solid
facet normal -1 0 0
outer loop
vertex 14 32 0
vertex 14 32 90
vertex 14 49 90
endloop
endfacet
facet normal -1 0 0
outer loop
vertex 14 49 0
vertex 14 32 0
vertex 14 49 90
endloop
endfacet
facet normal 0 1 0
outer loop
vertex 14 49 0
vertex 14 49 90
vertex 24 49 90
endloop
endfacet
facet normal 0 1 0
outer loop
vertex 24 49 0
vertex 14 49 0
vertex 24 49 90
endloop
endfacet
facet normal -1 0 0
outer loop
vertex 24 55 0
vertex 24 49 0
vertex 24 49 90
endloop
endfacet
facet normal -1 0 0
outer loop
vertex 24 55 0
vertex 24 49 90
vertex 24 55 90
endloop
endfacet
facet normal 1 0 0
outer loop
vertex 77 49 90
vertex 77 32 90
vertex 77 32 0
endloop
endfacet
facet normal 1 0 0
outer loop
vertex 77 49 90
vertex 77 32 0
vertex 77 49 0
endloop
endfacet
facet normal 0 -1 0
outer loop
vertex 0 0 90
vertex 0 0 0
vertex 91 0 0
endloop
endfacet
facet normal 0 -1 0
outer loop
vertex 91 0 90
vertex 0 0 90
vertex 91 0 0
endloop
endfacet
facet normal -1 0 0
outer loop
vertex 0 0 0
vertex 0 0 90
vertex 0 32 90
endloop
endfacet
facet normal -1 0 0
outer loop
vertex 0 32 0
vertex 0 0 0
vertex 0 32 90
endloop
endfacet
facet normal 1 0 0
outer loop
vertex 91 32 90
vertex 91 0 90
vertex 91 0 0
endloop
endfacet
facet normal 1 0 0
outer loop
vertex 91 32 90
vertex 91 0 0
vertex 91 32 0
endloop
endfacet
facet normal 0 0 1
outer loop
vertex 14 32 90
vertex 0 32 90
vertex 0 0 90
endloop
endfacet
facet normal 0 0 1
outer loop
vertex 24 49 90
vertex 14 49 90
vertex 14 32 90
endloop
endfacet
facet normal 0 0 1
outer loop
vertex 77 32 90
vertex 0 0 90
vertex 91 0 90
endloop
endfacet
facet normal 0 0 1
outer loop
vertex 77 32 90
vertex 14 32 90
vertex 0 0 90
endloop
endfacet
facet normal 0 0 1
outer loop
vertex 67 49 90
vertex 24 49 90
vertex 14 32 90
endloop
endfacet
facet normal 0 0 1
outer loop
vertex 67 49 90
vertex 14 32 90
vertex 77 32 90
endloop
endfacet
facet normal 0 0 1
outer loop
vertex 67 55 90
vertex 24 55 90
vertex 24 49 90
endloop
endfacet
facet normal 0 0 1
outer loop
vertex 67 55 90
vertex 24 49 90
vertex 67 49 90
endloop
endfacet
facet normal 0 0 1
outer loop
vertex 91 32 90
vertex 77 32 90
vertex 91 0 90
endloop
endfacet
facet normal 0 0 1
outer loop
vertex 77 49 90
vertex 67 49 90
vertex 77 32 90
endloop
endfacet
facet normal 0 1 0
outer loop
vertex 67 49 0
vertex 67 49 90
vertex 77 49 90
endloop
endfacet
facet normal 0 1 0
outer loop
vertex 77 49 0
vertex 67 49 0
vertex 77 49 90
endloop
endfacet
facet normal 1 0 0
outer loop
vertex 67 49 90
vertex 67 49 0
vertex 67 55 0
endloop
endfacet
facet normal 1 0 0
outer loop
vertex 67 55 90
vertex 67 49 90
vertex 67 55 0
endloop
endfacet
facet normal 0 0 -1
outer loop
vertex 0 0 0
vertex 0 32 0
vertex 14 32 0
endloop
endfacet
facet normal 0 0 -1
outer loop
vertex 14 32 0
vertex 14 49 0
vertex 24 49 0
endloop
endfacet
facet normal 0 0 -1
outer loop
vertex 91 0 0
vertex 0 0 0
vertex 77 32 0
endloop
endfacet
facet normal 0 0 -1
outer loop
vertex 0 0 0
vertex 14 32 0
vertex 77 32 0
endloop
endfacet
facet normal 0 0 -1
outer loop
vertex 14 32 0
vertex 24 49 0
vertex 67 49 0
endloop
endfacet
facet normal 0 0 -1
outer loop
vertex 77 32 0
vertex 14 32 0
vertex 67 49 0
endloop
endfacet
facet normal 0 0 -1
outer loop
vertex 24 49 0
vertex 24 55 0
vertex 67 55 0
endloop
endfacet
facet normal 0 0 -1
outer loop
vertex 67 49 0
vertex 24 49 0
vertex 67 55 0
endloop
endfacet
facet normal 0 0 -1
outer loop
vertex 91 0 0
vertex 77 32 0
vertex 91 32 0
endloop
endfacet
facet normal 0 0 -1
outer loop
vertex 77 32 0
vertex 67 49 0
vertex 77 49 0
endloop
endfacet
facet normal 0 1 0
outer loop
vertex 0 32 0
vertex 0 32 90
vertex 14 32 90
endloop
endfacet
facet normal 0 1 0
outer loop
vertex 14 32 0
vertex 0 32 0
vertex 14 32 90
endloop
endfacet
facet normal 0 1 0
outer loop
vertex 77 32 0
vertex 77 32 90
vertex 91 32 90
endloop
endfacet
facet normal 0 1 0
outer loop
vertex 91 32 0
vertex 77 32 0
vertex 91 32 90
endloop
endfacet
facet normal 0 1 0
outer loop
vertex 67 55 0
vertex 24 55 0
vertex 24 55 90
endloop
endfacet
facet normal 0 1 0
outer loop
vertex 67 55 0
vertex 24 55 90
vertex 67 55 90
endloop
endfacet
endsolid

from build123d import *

# Parameters (mm, degrees)
SKETCH1_W           = 91
SKETCH1_H           = 55
BOSS_EXTRUDE1_DEPTH = 90
SKETCH2_W           = 24
SKETCH2_H           = 6
CUT_EXTRUDE1_DEPTH  = 91
SKETCH3_W           = 14
SKETCH3_H           = 17
CUT_EXTRUDE2_DEPTH  = 91


with BuildPart() as part:
    # Sketch1 → Boss-Extrude1 (new body)
    with BuildSketch(Plane.XY):
        with Locations((45.5, 27.5)):
            Rectangle(SKETCH1_W, SKETCH1_H)
    extrude(amount=BOSS_EXTRUDE1_DEPTH)

    # Sketch2 → Cut-Extrude1 (cut, through all)
    with BuildSketch(Plane.XY.offset(90)):
        with Locations((79, 52)):
            Rectangle(SKETCH2_W, SKETCH2_H)
        with Locations((12, 52)):
            Rectangle(SKETCH2_W, SKETCH2_H)
    extrude(amount=-CUT_EXTRUDE1_DEPTH, mode=Mode.SUBTRACT)

    # Sketch3 → Cut-Extrude2 (cut, through all)
    with BuildSketch(Plane.XY.offset(90)):
        with Locations((84, 40.5)):
            Rectangle(SKETCH3_W, SKETCH3_H)
        with Locations((7, 40.5)):
            Rectangle(SKETCH3_W, SKETCH3_H)
    extrude(amount=-CUT_EXTRUDE2_DEPTH, mode=Mode.SUBTRACT)


solid = part.part
